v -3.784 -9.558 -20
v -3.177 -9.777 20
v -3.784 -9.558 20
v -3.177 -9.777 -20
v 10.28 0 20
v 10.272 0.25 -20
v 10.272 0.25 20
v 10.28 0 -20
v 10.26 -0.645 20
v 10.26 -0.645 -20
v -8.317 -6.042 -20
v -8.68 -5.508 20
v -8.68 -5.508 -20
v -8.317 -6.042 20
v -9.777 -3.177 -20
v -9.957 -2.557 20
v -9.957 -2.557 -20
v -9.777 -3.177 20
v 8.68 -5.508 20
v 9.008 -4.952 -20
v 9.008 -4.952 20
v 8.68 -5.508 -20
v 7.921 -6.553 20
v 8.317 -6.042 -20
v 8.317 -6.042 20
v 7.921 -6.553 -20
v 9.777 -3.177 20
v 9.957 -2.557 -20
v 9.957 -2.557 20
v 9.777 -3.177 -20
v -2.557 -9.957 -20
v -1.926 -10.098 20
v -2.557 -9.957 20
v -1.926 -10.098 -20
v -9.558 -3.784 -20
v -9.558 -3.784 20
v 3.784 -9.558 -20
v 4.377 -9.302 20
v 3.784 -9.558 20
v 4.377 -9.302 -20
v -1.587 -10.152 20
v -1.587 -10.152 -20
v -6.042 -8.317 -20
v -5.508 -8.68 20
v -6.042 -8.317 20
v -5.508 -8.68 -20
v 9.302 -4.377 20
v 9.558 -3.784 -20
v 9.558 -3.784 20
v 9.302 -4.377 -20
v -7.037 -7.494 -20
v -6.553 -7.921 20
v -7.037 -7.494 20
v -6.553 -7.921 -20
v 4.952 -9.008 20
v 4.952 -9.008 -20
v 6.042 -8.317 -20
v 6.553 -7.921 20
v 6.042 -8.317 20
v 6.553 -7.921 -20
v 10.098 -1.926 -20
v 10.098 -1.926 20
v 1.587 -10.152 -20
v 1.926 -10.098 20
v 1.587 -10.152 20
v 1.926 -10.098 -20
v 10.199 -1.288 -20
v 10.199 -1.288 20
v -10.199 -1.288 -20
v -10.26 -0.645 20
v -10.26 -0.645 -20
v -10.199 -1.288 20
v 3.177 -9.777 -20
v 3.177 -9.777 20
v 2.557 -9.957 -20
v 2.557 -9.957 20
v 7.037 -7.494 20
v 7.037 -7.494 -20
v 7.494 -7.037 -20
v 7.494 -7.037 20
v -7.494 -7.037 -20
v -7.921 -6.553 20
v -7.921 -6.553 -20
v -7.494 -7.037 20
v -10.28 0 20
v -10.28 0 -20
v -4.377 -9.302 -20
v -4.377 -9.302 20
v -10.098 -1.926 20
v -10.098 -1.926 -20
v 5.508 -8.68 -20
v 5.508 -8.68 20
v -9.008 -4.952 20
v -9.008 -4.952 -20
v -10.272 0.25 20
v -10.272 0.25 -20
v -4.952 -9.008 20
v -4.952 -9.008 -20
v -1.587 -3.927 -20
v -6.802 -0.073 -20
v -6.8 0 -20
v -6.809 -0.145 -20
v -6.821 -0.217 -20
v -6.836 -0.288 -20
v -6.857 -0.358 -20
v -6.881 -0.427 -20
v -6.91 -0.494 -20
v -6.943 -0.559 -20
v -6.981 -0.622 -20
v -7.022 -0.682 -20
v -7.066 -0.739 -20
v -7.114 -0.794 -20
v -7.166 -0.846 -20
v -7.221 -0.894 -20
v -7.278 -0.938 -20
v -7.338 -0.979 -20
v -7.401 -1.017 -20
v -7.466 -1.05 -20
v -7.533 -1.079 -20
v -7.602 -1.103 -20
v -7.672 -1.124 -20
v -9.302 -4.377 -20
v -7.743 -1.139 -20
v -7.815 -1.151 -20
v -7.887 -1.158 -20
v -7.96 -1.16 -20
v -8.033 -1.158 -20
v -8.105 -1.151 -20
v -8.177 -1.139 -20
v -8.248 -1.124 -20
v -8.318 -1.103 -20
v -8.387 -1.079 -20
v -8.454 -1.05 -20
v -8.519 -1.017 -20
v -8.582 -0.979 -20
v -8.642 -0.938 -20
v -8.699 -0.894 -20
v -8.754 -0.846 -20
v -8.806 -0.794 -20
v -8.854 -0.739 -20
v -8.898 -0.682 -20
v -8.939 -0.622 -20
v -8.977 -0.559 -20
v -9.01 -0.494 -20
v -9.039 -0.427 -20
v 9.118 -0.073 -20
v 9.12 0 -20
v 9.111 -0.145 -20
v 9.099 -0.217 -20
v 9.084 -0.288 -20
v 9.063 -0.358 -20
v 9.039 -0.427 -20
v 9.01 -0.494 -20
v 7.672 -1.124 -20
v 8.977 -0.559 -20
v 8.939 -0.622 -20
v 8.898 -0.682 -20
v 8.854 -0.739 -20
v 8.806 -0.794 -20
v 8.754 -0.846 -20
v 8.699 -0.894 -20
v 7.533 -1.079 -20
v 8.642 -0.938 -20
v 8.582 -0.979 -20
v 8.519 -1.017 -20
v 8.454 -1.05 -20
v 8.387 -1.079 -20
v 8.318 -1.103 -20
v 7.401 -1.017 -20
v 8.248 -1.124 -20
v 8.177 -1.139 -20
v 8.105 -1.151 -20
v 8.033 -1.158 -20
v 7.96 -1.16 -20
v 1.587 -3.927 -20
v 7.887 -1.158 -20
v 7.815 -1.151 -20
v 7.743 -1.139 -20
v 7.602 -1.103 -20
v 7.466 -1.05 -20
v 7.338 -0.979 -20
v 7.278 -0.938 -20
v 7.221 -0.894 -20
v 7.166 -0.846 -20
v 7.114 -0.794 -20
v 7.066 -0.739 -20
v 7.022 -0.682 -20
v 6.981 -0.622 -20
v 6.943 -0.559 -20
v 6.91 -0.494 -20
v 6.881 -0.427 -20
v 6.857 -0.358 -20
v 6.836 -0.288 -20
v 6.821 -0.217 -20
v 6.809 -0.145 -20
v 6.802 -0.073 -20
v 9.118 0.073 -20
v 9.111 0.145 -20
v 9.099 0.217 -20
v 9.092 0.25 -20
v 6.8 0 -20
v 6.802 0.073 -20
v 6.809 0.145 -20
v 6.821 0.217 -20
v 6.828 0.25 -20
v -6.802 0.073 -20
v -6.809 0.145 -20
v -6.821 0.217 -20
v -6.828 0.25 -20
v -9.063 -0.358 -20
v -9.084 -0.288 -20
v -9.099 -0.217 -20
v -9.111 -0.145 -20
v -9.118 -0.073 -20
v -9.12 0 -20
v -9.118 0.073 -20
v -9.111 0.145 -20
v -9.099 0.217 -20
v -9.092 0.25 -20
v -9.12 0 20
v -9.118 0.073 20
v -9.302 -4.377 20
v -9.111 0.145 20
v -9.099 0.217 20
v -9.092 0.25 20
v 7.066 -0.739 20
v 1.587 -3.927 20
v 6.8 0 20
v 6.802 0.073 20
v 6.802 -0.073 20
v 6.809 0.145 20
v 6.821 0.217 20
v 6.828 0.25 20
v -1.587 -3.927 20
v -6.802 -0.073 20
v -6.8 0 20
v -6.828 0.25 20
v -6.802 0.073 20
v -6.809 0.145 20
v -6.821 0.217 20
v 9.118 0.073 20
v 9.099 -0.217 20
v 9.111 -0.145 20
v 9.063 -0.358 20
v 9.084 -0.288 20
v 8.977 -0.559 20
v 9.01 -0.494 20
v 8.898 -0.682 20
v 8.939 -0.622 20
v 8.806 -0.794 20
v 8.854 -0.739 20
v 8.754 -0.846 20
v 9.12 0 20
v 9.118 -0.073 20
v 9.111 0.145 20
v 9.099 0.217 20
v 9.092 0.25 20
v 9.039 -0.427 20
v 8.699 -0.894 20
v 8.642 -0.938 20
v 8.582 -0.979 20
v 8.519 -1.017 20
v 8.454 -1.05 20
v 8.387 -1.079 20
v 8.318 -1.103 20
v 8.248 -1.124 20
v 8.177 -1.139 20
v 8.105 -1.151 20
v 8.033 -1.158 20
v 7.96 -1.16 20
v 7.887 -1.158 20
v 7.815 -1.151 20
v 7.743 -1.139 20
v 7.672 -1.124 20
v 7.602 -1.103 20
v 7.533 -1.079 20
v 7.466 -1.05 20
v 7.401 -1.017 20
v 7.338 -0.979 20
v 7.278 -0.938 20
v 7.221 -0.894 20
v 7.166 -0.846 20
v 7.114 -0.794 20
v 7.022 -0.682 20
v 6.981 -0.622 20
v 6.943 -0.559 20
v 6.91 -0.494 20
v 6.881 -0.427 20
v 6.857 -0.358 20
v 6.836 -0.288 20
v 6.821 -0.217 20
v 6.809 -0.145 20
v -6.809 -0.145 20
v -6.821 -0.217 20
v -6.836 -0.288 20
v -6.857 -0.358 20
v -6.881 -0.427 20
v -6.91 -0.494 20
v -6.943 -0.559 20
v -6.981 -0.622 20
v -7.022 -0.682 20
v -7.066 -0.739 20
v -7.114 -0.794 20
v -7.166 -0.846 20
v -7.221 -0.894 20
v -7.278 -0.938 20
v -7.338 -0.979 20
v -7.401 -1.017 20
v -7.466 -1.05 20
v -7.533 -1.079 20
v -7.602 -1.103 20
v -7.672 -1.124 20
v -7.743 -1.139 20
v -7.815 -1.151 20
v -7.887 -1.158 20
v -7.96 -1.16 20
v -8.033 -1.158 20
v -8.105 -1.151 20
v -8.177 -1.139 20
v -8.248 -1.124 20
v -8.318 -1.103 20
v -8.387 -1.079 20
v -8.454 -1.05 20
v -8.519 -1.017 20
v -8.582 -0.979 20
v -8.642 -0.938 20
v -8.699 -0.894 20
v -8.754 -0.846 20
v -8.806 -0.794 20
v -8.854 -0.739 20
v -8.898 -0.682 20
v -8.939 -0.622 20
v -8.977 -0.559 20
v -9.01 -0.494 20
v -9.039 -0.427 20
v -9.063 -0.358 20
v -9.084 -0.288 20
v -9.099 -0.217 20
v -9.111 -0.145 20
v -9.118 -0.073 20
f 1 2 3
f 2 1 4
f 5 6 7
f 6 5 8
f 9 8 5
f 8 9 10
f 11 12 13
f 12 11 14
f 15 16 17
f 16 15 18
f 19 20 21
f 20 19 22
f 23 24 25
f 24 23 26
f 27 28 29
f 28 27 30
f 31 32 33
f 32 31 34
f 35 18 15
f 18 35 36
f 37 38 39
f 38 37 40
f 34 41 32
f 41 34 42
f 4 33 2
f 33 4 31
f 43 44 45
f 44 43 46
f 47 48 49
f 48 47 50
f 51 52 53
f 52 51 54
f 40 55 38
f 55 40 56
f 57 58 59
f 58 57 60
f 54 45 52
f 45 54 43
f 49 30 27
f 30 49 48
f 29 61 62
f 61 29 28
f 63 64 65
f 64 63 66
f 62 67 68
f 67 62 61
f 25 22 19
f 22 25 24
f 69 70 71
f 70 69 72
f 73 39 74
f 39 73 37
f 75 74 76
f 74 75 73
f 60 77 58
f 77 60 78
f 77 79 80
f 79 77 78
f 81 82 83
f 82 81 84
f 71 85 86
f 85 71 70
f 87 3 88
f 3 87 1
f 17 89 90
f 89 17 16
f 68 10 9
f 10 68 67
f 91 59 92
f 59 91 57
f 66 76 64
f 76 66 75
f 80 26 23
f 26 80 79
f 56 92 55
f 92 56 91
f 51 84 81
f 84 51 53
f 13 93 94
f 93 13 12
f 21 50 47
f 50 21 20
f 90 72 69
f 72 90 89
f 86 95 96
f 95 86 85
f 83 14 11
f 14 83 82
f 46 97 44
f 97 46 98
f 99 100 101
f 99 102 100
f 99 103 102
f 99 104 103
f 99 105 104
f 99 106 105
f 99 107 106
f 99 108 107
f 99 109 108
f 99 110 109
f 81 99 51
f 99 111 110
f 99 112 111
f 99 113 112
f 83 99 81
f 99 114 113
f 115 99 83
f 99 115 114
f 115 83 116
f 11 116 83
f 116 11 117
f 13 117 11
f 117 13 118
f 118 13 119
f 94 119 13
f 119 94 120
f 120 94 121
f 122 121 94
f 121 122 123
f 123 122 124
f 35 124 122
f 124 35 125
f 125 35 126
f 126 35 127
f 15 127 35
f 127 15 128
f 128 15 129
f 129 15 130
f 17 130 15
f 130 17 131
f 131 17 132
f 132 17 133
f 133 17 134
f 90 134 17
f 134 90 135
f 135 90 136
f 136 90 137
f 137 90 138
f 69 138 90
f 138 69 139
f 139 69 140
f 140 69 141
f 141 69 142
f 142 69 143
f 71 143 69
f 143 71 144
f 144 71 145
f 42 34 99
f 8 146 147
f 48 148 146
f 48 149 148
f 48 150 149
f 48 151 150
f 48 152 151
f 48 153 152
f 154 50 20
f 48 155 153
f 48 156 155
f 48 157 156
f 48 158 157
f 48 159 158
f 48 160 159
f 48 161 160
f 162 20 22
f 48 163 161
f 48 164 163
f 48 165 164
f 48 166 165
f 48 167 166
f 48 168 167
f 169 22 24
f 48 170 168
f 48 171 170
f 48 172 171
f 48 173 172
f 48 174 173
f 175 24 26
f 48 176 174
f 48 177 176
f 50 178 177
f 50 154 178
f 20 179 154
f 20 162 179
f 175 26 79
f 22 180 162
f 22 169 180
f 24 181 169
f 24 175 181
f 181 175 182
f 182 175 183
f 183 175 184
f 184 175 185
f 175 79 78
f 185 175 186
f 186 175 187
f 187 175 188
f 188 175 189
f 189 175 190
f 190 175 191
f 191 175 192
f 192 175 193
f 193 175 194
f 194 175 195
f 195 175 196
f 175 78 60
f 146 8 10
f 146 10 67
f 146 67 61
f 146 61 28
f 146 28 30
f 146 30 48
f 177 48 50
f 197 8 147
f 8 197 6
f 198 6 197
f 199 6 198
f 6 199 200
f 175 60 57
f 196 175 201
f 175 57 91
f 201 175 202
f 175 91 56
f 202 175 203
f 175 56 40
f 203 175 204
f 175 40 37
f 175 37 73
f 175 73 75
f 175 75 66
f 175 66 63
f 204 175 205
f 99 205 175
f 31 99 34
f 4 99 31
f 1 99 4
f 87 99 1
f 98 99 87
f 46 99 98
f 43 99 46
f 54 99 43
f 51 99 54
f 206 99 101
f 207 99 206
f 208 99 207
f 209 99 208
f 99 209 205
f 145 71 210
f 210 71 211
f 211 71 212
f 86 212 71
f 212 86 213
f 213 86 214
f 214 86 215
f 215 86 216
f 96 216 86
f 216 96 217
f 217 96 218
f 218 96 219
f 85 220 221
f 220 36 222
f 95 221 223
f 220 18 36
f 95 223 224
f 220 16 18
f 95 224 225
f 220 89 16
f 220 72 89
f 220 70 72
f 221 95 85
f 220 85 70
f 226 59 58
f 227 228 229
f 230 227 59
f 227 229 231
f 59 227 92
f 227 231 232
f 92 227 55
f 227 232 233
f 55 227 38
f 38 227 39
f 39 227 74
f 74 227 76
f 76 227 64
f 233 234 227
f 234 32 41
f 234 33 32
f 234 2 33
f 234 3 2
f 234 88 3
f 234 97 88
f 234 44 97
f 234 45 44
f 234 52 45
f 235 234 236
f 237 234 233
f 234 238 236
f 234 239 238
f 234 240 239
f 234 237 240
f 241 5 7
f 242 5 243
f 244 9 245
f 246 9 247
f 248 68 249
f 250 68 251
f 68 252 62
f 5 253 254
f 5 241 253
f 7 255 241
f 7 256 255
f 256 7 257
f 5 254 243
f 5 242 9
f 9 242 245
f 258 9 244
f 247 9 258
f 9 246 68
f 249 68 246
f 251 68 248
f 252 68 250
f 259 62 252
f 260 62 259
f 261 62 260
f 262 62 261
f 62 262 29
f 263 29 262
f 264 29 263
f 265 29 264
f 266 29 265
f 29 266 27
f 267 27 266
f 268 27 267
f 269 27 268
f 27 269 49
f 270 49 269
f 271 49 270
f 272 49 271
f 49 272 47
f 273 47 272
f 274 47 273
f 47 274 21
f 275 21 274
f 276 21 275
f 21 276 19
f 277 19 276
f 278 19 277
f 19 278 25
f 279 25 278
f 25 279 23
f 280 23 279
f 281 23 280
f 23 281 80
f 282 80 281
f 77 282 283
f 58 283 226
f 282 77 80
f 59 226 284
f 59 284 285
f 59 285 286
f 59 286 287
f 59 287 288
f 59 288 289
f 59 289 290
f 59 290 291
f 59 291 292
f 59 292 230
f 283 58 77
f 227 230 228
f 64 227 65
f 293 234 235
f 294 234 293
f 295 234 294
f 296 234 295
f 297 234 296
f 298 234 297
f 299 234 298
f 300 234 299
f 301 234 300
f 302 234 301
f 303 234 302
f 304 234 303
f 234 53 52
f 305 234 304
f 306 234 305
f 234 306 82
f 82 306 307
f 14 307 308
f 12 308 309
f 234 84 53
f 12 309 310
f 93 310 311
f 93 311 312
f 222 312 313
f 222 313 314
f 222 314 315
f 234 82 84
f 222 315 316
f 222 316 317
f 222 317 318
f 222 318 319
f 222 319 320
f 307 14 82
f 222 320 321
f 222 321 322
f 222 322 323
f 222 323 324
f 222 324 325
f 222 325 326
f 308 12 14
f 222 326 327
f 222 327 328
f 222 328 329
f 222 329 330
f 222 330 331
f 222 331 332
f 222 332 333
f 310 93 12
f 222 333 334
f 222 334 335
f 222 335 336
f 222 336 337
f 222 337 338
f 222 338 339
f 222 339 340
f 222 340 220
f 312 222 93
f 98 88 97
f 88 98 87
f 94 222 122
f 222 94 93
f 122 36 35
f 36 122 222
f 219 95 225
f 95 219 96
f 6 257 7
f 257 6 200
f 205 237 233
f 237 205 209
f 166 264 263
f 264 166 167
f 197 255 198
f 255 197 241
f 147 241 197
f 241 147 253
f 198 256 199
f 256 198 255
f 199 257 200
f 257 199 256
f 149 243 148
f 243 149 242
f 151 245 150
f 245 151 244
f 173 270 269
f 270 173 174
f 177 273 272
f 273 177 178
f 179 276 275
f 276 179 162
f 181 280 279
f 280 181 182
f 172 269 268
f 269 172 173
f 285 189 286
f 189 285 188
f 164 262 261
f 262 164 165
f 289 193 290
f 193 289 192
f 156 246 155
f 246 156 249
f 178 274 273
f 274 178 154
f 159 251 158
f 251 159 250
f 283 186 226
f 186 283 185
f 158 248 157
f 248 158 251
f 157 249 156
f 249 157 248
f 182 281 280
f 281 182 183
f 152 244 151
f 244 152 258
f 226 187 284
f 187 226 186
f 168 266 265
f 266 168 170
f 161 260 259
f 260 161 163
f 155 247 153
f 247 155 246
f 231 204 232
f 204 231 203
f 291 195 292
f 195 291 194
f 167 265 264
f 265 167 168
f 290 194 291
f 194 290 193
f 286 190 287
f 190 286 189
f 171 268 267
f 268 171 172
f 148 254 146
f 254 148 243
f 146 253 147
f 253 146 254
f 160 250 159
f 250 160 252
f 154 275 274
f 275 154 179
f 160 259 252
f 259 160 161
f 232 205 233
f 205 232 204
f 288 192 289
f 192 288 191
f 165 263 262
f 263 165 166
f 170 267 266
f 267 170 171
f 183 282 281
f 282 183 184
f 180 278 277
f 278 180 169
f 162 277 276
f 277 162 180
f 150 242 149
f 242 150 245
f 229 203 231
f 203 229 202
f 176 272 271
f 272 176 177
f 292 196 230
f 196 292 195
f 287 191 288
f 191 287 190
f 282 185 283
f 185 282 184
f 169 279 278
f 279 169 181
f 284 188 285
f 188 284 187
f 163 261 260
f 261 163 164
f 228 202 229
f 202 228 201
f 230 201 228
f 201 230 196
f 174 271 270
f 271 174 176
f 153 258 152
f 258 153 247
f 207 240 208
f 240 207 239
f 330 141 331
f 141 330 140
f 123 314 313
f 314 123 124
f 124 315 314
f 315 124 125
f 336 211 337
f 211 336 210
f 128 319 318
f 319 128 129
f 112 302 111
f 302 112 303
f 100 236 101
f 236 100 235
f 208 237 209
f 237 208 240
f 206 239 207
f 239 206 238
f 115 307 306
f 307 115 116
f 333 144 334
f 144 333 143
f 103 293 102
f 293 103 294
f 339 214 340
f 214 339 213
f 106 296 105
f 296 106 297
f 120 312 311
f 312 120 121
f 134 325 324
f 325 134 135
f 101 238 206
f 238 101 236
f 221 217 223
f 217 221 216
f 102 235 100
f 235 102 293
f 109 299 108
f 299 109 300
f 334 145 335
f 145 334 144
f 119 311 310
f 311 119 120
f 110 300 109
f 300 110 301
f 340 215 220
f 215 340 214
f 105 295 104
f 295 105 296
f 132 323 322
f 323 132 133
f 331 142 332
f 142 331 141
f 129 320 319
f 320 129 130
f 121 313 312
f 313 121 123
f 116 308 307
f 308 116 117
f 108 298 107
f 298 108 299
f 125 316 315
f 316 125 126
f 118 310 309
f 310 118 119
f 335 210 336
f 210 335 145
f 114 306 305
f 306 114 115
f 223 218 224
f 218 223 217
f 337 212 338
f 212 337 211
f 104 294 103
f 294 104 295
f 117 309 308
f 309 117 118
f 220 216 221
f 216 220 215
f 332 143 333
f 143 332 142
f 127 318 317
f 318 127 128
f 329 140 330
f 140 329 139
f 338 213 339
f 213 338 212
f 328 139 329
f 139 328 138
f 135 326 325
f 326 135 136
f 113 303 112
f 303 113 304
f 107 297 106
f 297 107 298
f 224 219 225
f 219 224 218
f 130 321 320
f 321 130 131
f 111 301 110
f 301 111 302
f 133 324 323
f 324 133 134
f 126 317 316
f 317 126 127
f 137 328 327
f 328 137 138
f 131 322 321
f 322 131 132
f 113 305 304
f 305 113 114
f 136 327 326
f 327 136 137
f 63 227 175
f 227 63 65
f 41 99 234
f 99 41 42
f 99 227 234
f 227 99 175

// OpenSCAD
// Clip Parameters
$clipDepth = 40;
$slotThickness = 3.175; // 1/8"

// Shelf Parameters
$wireThickness = 2.32;
$distanceBetweenWires = 13.6;

{} // Prevents the customizer from picking up anything below this

$fn = 100;

difference(){
    // Main Clip Body
    $clipWidth = $distanceBetweenWires + $wireThickness * 3;
    cylinder(h = $clipDepth, d = $clipWidth, center = true);

    // Cut the Body in Half
    translate([0,$clipWidth/4+0.25,0])
    cube([$clipWidth,$clipWidth/2,$clipDepth*1.1], center = true);  
    
    // Cutouts to Clip Onto Wires
    $wireOffset = $distanceBetweenWires/2+ $wireThickness/2;
    translate([$wireOffset,0,0])
    cylinder(h = $clipDepth * 1.1, d = $wireThickness, center = true);
    
    translate([-$wireOffset,0,0])
    cylinder(h = $clipDepth * 1.1, d = $wireThickness, center = true);

    // Cut the Slot for the Dividor
    translate([0,-$distanceBetweenWires/1.5,0])
    cube([$slotThickness,$clipWidth/2,$clipDepth*1.1], center = true);  
}
